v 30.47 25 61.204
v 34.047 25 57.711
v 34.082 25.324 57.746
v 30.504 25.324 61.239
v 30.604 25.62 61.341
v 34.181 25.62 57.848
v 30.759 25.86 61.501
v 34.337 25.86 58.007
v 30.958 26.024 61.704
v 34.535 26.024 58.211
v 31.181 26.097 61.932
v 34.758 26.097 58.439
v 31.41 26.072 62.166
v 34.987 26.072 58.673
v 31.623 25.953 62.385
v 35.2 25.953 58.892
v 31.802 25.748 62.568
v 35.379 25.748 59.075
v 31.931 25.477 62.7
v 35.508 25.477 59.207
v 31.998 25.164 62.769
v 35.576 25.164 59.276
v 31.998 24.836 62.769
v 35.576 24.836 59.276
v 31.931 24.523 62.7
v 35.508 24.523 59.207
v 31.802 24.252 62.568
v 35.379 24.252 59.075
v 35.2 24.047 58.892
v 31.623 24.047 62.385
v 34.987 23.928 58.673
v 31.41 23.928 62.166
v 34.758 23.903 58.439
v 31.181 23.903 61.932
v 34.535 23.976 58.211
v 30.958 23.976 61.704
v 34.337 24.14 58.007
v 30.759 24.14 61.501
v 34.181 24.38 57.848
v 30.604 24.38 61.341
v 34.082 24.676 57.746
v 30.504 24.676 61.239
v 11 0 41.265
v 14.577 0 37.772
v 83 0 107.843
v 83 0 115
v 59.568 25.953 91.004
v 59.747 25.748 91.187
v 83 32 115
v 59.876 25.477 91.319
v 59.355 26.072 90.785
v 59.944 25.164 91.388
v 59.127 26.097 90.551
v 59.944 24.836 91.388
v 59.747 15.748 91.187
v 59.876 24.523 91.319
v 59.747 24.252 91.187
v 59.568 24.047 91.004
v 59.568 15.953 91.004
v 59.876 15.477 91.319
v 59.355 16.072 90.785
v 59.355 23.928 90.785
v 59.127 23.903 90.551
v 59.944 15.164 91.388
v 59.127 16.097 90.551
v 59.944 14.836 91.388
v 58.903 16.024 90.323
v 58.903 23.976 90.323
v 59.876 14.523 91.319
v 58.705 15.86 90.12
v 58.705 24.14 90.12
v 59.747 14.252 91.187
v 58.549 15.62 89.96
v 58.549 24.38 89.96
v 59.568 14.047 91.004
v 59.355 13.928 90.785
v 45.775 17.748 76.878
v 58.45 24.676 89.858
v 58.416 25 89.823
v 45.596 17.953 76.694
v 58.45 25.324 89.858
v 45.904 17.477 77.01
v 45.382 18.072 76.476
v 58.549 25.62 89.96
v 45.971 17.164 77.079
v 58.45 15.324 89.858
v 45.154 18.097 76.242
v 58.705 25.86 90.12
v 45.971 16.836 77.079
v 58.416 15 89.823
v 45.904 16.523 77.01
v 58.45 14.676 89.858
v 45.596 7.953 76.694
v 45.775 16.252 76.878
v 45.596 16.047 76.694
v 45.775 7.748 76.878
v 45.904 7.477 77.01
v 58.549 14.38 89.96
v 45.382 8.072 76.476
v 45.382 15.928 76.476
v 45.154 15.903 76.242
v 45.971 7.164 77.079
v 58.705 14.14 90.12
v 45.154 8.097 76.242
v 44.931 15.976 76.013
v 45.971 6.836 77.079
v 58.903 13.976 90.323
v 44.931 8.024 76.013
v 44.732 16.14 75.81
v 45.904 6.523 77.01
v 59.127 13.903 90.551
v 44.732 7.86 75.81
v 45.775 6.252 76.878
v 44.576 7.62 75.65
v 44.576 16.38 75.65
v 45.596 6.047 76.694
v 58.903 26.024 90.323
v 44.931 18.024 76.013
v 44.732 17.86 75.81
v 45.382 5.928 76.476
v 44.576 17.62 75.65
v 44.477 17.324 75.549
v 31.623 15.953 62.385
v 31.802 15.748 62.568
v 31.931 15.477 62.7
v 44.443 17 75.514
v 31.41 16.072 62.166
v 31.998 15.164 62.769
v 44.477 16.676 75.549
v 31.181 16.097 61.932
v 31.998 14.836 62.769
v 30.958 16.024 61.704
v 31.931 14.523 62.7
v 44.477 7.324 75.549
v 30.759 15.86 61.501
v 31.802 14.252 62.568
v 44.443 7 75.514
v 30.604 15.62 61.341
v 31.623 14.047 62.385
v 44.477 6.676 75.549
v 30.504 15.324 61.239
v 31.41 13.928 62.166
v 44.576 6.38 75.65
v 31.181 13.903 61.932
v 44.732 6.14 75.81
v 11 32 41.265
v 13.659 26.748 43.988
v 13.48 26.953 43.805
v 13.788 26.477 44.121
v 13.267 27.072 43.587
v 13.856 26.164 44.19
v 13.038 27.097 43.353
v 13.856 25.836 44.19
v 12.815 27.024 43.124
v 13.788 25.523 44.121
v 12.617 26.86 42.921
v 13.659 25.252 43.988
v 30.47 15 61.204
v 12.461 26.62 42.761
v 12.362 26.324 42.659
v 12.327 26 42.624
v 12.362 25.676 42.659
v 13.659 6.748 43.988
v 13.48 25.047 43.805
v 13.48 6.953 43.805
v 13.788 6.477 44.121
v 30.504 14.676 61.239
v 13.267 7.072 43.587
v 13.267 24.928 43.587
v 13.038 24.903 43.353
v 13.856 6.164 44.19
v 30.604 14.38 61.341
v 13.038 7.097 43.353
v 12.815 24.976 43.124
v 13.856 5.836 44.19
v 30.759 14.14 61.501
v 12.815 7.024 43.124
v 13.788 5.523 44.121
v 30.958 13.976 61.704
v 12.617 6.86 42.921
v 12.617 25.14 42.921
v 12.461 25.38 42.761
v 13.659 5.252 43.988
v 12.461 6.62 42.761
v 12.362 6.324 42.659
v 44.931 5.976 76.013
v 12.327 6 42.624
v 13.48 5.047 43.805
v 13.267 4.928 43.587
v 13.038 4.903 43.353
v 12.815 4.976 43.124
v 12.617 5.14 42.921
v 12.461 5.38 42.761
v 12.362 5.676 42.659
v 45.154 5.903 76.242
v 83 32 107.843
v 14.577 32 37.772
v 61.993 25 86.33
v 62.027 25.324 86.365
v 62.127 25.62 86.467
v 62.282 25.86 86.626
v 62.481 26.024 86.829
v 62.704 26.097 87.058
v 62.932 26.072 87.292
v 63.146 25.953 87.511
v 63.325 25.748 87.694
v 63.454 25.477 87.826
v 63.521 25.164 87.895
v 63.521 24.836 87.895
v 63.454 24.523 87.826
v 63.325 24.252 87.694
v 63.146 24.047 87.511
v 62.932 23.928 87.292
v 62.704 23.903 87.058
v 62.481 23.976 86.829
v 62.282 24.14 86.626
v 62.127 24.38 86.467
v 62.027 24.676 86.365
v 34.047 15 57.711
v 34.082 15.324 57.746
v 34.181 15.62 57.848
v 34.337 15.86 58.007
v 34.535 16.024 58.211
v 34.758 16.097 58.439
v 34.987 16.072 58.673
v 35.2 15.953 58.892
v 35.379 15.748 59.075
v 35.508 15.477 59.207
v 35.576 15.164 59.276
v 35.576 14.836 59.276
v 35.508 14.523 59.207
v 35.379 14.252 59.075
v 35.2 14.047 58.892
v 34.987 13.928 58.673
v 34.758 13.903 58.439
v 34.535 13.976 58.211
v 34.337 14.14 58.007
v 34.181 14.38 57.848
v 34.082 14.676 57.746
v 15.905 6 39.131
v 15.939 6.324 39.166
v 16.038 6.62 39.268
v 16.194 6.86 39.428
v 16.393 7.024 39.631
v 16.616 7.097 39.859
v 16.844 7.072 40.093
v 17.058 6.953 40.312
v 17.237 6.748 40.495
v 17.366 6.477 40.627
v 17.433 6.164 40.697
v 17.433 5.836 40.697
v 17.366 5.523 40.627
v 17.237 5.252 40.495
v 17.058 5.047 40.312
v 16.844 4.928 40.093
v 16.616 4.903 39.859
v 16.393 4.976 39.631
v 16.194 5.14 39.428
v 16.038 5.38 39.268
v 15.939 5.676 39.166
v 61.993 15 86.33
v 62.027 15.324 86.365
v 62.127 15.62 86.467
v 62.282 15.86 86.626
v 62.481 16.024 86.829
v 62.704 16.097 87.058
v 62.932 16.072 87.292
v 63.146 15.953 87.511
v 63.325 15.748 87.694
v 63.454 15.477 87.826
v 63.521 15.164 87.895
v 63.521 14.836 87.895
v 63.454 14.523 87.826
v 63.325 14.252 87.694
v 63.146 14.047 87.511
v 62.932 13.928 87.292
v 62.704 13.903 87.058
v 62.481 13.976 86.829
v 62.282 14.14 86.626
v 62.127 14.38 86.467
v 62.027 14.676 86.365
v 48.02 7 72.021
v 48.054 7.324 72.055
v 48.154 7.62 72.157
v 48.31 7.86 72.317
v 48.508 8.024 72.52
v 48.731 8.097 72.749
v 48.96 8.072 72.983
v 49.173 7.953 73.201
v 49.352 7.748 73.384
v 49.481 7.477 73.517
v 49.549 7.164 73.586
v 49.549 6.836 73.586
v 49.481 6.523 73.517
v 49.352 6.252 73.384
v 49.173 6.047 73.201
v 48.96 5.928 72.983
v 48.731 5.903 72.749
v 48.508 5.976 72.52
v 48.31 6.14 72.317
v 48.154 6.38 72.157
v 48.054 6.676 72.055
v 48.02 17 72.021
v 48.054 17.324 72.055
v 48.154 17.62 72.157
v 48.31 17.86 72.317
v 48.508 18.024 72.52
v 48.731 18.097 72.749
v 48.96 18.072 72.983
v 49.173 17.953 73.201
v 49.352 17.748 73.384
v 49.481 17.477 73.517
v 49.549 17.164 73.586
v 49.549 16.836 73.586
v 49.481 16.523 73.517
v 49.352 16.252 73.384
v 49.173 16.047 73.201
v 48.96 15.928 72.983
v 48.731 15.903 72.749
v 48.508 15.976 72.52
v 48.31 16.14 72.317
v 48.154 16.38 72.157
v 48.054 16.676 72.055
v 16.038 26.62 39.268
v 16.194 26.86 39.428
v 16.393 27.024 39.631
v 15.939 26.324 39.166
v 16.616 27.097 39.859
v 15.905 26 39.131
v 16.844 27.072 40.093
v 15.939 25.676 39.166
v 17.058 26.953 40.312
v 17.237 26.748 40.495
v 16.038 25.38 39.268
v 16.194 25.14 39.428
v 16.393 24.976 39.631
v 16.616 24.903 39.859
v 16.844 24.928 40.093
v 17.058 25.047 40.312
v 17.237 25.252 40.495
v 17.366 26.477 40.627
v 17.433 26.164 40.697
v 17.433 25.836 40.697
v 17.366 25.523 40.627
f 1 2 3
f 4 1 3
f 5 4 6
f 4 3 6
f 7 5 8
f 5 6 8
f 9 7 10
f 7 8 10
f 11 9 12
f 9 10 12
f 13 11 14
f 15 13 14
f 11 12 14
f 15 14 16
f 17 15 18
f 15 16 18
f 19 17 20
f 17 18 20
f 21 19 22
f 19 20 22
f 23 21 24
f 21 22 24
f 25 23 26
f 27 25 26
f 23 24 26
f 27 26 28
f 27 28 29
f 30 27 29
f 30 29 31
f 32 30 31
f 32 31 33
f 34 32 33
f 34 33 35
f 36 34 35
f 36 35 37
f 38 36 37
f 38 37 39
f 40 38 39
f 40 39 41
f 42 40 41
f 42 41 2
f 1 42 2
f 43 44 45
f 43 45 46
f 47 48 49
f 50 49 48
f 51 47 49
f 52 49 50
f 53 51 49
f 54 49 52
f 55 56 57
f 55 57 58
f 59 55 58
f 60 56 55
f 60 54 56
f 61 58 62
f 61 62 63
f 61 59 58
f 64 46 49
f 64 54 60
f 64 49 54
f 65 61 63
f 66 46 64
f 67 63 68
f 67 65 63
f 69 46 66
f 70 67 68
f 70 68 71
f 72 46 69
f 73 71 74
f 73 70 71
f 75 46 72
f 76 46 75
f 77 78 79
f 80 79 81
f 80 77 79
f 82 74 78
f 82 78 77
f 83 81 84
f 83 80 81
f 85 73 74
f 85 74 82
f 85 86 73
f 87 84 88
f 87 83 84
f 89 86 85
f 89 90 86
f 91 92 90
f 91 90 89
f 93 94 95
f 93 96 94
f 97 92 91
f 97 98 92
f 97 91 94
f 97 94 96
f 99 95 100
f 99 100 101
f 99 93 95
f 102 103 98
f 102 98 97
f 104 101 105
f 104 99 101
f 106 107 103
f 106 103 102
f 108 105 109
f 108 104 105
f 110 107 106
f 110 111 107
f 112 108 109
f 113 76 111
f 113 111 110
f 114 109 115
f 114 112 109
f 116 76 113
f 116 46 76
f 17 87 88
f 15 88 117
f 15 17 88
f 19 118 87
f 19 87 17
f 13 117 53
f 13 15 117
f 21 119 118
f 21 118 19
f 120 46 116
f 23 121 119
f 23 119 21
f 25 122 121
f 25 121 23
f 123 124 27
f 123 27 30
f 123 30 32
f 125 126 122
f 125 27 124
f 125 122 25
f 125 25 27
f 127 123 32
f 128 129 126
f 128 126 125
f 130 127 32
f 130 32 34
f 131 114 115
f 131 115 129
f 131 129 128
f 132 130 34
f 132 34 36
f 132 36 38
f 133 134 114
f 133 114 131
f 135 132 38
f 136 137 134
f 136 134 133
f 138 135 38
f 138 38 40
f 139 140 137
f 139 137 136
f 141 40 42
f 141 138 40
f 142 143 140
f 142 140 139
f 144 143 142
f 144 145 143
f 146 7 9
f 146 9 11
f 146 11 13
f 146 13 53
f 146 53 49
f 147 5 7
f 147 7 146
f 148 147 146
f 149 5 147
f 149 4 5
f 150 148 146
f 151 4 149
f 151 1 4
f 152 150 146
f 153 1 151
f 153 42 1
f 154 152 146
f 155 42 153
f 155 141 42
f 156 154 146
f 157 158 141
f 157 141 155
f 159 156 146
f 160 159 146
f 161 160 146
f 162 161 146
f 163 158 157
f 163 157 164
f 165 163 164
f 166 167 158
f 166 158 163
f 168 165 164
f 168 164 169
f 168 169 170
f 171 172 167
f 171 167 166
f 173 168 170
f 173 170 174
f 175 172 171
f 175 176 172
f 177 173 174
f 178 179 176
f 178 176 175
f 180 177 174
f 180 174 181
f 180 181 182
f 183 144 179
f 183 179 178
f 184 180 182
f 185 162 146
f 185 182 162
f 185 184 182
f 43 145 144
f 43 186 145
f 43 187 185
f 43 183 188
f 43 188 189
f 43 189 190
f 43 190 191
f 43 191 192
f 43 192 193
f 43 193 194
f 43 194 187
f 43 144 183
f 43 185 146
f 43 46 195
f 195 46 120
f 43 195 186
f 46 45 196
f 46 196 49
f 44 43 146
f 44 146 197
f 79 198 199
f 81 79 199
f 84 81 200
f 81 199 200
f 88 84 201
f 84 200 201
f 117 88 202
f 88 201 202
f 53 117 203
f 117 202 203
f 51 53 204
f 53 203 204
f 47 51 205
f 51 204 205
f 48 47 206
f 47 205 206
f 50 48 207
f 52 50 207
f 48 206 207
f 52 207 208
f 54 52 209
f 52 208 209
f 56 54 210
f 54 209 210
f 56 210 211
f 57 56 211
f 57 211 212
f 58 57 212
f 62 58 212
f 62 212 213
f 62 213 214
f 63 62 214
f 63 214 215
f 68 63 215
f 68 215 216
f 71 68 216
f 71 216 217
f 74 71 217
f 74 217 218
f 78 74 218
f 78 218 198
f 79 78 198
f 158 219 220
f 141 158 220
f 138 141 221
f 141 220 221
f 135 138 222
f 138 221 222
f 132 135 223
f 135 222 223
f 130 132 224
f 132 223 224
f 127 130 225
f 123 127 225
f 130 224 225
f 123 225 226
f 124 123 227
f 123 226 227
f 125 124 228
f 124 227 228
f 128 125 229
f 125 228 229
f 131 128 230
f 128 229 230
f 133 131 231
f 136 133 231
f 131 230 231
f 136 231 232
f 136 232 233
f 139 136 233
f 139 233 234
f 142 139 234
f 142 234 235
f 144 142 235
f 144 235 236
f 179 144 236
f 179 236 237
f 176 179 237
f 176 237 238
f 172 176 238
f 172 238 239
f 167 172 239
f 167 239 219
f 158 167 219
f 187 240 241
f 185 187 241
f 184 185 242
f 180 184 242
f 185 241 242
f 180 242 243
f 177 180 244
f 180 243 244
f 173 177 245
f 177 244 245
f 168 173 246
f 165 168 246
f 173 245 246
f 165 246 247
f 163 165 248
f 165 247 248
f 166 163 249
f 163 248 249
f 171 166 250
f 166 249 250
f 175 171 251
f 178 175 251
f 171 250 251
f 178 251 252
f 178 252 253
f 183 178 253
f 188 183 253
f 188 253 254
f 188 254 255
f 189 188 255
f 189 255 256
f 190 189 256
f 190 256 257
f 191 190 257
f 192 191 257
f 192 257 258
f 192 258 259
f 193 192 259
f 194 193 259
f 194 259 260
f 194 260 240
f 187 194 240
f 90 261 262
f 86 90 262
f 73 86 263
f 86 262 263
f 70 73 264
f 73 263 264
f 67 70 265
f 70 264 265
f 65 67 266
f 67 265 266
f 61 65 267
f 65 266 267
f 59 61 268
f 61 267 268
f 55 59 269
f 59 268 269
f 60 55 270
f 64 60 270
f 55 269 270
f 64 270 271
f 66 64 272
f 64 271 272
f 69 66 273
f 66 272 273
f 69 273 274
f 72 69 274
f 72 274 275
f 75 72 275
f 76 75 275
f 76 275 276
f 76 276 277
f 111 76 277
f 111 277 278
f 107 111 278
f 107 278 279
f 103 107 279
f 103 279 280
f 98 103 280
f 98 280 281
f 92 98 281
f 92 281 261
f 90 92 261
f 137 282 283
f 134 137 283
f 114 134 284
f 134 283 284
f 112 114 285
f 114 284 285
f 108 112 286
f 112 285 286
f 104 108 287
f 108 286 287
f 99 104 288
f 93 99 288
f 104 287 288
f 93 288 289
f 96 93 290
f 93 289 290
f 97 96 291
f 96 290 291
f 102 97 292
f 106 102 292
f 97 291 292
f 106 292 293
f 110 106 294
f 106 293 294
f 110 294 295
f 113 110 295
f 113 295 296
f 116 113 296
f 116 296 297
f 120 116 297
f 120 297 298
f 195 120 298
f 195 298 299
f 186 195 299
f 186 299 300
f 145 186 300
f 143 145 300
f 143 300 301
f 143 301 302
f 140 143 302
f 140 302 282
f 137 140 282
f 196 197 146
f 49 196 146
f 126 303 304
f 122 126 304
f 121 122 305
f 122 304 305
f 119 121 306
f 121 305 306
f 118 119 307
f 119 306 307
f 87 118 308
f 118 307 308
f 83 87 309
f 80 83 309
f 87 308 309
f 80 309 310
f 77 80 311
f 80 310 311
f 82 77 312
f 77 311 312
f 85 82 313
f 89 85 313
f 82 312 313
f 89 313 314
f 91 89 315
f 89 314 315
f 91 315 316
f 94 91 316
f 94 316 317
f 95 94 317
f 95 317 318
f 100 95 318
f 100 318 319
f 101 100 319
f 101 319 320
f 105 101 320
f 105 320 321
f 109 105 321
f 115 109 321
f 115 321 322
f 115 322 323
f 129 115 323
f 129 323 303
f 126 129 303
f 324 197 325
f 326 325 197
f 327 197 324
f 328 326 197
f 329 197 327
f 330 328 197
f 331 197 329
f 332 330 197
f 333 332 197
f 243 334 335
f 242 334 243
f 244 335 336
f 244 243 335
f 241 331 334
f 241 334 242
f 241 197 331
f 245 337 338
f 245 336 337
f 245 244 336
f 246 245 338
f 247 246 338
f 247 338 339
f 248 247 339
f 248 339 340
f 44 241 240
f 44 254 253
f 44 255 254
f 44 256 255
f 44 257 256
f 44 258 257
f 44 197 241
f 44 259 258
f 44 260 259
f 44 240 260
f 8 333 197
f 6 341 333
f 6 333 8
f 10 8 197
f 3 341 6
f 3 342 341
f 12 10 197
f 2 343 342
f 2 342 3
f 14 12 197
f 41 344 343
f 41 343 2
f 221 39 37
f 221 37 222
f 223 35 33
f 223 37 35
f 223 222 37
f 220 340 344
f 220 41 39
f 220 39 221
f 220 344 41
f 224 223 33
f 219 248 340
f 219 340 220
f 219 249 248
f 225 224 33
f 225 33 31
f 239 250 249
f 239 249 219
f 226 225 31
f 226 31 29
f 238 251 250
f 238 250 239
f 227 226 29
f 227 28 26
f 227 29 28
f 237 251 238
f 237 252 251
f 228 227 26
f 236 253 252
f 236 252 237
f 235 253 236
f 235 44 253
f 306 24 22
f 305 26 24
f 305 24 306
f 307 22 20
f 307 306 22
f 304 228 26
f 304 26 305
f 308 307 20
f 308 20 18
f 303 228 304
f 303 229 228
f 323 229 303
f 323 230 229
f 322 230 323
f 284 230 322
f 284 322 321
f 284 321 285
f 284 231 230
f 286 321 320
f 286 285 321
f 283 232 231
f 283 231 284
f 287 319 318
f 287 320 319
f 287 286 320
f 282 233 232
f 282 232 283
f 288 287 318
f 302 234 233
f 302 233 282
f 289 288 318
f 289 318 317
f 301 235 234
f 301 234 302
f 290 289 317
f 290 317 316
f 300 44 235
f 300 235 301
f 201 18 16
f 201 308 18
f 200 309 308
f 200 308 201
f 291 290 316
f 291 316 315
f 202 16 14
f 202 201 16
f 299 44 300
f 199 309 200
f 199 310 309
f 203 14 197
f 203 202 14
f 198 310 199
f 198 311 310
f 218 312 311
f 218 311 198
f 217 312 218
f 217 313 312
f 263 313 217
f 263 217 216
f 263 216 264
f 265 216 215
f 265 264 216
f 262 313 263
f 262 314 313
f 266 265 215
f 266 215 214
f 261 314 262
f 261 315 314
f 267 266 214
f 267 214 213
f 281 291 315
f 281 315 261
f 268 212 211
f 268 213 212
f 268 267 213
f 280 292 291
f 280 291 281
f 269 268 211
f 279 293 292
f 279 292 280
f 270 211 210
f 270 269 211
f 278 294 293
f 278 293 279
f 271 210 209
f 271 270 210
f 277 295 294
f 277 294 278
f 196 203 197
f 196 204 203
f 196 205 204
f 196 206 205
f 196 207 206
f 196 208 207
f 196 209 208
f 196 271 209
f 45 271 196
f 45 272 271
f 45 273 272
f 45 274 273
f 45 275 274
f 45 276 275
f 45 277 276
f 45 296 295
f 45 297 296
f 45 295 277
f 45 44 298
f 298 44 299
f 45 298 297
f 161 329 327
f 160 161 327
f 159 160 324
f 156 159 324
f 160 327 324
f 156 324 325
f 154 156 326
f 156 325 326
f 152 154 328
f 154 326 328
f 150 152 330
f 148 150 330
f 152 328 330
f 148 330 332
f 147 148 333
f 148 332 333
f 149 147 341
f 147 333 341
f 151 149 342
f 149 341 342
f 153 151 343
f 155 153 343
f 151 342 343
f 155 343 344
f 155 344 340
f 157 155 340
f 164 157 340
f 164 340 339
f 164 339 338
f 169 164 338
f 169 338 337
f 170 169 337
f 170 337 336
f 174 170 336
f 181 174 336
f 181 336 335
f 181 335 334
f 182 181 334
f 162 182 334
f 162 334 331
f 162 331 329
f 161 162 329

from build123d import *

# Parameters (mm, degrees)
BOSS_EXTRUDE1_DEPTH = 32
FILLET1_R           = 10
SKETCH4_W           = 170.11041037
SKETCH4_H           = 258.008077424
CUT_EXTRUDE2_DEPTH  = 33
SKETCH5_R           = 1.1
CUT_EXTRUDE3_DEPTH  = 57.514129524
SKETCH6_R           = 1.1
CUT_EXTRUDE4_DEPTH  = 57.514129524


with BuildPart() as part:
    # Sketch1 → Boss-Extrude1 (new body)
    with BuildSketch(Plane(origin=(0, 0, 0), x_dir=(1, 0, 0), z_dir=(0, 1, 0))):
        Polygon((0, 0), (0, 30), (83, 115), (83, 107.843231513), (5, 27.963713441), (5, -27.963713441), (83, -107.843231513), (83, -115), (0, -30), align=None)
    extrude(amount=BOSS_EXTRUDE1_DEPTH)

    # Fillet1
    fillet1_edges = [part.edges().sort_by_distance(p)[0] for p in [
        (0, 16, 30),
        (0, 16, -30),
    ]]
    fillet(fillet1_edges, radius=FILLET1_R)

    # Sketch4 → Cut-Extrude2 (cut, through all)
    with BuildSketch(Plane(origin=(0, 32, 0), x_dir=(1, 0, 0), z_dir=(0, 1, 0))):
        with Locations((35.635219957, -4.046970822)):
            Rectangle(SKETCH4_W, SKETCH4_H)
        Polygon((14.577370106, -37.771863549), (86.577370106, -111.506803308), (83, -115), (11, -41.265060241), align=None, mode=Mode.SUBTRACT)
    extrude(amount=-CUT_EXTRUDE2_DEPTH, mode=Mode.SUBTRACT)

    # Sketch5 → Cut-Extrude3 (cut, through all)
    with BuildSketch(Plane(origin=(-11.418378796, 0, 11.14971106), x_dir=(-0.698639338, 0, -0.715474021), z_dir=(0.715474021, 0, -0.698639338))):
        with Locations((-40.209111306, 26)):
            Circle(SKETCH5_R)
        with Locations((-40.209111306, 6)):
            Circle(SKETCH5_R)
    extrude(amount=-CUT_EXTRUDE3_DEPTH, mode=Mode.SUBTRACT)

    # Sketch6 → Cut-Extrude4 (cut, through all)
    with BuildSketch(Plane(origin=(-11.418378796, 0, 11.14971106), x_dir=(-0.698639338, 0, -0.715474021), z_dir=(0.715474021, 0, -0.698639338))):
        with Locations((-66.177603446, 25)):
            Circle(SKETCH6_R)
        with Locations((-66.177603446, 15)):
            Circle(SKETCH6_R)
        with Locations((-106.177603446, 15)):
            Circle(SKETCH6_R)
        with Locations((-106.177603446, 25)):
            Circle(SKETCH6_R)
        with Locations((-86.177603446, 17)):
            Circle(SKETCH6_R)
        with Locations((-86.177603446, 7)):
            Circle(SKETCH6_R)
    extrude(amount=-CUT_EXTRUDE4_DEPTH, mode=Mode.SUBTRACT)


solid = part.part
